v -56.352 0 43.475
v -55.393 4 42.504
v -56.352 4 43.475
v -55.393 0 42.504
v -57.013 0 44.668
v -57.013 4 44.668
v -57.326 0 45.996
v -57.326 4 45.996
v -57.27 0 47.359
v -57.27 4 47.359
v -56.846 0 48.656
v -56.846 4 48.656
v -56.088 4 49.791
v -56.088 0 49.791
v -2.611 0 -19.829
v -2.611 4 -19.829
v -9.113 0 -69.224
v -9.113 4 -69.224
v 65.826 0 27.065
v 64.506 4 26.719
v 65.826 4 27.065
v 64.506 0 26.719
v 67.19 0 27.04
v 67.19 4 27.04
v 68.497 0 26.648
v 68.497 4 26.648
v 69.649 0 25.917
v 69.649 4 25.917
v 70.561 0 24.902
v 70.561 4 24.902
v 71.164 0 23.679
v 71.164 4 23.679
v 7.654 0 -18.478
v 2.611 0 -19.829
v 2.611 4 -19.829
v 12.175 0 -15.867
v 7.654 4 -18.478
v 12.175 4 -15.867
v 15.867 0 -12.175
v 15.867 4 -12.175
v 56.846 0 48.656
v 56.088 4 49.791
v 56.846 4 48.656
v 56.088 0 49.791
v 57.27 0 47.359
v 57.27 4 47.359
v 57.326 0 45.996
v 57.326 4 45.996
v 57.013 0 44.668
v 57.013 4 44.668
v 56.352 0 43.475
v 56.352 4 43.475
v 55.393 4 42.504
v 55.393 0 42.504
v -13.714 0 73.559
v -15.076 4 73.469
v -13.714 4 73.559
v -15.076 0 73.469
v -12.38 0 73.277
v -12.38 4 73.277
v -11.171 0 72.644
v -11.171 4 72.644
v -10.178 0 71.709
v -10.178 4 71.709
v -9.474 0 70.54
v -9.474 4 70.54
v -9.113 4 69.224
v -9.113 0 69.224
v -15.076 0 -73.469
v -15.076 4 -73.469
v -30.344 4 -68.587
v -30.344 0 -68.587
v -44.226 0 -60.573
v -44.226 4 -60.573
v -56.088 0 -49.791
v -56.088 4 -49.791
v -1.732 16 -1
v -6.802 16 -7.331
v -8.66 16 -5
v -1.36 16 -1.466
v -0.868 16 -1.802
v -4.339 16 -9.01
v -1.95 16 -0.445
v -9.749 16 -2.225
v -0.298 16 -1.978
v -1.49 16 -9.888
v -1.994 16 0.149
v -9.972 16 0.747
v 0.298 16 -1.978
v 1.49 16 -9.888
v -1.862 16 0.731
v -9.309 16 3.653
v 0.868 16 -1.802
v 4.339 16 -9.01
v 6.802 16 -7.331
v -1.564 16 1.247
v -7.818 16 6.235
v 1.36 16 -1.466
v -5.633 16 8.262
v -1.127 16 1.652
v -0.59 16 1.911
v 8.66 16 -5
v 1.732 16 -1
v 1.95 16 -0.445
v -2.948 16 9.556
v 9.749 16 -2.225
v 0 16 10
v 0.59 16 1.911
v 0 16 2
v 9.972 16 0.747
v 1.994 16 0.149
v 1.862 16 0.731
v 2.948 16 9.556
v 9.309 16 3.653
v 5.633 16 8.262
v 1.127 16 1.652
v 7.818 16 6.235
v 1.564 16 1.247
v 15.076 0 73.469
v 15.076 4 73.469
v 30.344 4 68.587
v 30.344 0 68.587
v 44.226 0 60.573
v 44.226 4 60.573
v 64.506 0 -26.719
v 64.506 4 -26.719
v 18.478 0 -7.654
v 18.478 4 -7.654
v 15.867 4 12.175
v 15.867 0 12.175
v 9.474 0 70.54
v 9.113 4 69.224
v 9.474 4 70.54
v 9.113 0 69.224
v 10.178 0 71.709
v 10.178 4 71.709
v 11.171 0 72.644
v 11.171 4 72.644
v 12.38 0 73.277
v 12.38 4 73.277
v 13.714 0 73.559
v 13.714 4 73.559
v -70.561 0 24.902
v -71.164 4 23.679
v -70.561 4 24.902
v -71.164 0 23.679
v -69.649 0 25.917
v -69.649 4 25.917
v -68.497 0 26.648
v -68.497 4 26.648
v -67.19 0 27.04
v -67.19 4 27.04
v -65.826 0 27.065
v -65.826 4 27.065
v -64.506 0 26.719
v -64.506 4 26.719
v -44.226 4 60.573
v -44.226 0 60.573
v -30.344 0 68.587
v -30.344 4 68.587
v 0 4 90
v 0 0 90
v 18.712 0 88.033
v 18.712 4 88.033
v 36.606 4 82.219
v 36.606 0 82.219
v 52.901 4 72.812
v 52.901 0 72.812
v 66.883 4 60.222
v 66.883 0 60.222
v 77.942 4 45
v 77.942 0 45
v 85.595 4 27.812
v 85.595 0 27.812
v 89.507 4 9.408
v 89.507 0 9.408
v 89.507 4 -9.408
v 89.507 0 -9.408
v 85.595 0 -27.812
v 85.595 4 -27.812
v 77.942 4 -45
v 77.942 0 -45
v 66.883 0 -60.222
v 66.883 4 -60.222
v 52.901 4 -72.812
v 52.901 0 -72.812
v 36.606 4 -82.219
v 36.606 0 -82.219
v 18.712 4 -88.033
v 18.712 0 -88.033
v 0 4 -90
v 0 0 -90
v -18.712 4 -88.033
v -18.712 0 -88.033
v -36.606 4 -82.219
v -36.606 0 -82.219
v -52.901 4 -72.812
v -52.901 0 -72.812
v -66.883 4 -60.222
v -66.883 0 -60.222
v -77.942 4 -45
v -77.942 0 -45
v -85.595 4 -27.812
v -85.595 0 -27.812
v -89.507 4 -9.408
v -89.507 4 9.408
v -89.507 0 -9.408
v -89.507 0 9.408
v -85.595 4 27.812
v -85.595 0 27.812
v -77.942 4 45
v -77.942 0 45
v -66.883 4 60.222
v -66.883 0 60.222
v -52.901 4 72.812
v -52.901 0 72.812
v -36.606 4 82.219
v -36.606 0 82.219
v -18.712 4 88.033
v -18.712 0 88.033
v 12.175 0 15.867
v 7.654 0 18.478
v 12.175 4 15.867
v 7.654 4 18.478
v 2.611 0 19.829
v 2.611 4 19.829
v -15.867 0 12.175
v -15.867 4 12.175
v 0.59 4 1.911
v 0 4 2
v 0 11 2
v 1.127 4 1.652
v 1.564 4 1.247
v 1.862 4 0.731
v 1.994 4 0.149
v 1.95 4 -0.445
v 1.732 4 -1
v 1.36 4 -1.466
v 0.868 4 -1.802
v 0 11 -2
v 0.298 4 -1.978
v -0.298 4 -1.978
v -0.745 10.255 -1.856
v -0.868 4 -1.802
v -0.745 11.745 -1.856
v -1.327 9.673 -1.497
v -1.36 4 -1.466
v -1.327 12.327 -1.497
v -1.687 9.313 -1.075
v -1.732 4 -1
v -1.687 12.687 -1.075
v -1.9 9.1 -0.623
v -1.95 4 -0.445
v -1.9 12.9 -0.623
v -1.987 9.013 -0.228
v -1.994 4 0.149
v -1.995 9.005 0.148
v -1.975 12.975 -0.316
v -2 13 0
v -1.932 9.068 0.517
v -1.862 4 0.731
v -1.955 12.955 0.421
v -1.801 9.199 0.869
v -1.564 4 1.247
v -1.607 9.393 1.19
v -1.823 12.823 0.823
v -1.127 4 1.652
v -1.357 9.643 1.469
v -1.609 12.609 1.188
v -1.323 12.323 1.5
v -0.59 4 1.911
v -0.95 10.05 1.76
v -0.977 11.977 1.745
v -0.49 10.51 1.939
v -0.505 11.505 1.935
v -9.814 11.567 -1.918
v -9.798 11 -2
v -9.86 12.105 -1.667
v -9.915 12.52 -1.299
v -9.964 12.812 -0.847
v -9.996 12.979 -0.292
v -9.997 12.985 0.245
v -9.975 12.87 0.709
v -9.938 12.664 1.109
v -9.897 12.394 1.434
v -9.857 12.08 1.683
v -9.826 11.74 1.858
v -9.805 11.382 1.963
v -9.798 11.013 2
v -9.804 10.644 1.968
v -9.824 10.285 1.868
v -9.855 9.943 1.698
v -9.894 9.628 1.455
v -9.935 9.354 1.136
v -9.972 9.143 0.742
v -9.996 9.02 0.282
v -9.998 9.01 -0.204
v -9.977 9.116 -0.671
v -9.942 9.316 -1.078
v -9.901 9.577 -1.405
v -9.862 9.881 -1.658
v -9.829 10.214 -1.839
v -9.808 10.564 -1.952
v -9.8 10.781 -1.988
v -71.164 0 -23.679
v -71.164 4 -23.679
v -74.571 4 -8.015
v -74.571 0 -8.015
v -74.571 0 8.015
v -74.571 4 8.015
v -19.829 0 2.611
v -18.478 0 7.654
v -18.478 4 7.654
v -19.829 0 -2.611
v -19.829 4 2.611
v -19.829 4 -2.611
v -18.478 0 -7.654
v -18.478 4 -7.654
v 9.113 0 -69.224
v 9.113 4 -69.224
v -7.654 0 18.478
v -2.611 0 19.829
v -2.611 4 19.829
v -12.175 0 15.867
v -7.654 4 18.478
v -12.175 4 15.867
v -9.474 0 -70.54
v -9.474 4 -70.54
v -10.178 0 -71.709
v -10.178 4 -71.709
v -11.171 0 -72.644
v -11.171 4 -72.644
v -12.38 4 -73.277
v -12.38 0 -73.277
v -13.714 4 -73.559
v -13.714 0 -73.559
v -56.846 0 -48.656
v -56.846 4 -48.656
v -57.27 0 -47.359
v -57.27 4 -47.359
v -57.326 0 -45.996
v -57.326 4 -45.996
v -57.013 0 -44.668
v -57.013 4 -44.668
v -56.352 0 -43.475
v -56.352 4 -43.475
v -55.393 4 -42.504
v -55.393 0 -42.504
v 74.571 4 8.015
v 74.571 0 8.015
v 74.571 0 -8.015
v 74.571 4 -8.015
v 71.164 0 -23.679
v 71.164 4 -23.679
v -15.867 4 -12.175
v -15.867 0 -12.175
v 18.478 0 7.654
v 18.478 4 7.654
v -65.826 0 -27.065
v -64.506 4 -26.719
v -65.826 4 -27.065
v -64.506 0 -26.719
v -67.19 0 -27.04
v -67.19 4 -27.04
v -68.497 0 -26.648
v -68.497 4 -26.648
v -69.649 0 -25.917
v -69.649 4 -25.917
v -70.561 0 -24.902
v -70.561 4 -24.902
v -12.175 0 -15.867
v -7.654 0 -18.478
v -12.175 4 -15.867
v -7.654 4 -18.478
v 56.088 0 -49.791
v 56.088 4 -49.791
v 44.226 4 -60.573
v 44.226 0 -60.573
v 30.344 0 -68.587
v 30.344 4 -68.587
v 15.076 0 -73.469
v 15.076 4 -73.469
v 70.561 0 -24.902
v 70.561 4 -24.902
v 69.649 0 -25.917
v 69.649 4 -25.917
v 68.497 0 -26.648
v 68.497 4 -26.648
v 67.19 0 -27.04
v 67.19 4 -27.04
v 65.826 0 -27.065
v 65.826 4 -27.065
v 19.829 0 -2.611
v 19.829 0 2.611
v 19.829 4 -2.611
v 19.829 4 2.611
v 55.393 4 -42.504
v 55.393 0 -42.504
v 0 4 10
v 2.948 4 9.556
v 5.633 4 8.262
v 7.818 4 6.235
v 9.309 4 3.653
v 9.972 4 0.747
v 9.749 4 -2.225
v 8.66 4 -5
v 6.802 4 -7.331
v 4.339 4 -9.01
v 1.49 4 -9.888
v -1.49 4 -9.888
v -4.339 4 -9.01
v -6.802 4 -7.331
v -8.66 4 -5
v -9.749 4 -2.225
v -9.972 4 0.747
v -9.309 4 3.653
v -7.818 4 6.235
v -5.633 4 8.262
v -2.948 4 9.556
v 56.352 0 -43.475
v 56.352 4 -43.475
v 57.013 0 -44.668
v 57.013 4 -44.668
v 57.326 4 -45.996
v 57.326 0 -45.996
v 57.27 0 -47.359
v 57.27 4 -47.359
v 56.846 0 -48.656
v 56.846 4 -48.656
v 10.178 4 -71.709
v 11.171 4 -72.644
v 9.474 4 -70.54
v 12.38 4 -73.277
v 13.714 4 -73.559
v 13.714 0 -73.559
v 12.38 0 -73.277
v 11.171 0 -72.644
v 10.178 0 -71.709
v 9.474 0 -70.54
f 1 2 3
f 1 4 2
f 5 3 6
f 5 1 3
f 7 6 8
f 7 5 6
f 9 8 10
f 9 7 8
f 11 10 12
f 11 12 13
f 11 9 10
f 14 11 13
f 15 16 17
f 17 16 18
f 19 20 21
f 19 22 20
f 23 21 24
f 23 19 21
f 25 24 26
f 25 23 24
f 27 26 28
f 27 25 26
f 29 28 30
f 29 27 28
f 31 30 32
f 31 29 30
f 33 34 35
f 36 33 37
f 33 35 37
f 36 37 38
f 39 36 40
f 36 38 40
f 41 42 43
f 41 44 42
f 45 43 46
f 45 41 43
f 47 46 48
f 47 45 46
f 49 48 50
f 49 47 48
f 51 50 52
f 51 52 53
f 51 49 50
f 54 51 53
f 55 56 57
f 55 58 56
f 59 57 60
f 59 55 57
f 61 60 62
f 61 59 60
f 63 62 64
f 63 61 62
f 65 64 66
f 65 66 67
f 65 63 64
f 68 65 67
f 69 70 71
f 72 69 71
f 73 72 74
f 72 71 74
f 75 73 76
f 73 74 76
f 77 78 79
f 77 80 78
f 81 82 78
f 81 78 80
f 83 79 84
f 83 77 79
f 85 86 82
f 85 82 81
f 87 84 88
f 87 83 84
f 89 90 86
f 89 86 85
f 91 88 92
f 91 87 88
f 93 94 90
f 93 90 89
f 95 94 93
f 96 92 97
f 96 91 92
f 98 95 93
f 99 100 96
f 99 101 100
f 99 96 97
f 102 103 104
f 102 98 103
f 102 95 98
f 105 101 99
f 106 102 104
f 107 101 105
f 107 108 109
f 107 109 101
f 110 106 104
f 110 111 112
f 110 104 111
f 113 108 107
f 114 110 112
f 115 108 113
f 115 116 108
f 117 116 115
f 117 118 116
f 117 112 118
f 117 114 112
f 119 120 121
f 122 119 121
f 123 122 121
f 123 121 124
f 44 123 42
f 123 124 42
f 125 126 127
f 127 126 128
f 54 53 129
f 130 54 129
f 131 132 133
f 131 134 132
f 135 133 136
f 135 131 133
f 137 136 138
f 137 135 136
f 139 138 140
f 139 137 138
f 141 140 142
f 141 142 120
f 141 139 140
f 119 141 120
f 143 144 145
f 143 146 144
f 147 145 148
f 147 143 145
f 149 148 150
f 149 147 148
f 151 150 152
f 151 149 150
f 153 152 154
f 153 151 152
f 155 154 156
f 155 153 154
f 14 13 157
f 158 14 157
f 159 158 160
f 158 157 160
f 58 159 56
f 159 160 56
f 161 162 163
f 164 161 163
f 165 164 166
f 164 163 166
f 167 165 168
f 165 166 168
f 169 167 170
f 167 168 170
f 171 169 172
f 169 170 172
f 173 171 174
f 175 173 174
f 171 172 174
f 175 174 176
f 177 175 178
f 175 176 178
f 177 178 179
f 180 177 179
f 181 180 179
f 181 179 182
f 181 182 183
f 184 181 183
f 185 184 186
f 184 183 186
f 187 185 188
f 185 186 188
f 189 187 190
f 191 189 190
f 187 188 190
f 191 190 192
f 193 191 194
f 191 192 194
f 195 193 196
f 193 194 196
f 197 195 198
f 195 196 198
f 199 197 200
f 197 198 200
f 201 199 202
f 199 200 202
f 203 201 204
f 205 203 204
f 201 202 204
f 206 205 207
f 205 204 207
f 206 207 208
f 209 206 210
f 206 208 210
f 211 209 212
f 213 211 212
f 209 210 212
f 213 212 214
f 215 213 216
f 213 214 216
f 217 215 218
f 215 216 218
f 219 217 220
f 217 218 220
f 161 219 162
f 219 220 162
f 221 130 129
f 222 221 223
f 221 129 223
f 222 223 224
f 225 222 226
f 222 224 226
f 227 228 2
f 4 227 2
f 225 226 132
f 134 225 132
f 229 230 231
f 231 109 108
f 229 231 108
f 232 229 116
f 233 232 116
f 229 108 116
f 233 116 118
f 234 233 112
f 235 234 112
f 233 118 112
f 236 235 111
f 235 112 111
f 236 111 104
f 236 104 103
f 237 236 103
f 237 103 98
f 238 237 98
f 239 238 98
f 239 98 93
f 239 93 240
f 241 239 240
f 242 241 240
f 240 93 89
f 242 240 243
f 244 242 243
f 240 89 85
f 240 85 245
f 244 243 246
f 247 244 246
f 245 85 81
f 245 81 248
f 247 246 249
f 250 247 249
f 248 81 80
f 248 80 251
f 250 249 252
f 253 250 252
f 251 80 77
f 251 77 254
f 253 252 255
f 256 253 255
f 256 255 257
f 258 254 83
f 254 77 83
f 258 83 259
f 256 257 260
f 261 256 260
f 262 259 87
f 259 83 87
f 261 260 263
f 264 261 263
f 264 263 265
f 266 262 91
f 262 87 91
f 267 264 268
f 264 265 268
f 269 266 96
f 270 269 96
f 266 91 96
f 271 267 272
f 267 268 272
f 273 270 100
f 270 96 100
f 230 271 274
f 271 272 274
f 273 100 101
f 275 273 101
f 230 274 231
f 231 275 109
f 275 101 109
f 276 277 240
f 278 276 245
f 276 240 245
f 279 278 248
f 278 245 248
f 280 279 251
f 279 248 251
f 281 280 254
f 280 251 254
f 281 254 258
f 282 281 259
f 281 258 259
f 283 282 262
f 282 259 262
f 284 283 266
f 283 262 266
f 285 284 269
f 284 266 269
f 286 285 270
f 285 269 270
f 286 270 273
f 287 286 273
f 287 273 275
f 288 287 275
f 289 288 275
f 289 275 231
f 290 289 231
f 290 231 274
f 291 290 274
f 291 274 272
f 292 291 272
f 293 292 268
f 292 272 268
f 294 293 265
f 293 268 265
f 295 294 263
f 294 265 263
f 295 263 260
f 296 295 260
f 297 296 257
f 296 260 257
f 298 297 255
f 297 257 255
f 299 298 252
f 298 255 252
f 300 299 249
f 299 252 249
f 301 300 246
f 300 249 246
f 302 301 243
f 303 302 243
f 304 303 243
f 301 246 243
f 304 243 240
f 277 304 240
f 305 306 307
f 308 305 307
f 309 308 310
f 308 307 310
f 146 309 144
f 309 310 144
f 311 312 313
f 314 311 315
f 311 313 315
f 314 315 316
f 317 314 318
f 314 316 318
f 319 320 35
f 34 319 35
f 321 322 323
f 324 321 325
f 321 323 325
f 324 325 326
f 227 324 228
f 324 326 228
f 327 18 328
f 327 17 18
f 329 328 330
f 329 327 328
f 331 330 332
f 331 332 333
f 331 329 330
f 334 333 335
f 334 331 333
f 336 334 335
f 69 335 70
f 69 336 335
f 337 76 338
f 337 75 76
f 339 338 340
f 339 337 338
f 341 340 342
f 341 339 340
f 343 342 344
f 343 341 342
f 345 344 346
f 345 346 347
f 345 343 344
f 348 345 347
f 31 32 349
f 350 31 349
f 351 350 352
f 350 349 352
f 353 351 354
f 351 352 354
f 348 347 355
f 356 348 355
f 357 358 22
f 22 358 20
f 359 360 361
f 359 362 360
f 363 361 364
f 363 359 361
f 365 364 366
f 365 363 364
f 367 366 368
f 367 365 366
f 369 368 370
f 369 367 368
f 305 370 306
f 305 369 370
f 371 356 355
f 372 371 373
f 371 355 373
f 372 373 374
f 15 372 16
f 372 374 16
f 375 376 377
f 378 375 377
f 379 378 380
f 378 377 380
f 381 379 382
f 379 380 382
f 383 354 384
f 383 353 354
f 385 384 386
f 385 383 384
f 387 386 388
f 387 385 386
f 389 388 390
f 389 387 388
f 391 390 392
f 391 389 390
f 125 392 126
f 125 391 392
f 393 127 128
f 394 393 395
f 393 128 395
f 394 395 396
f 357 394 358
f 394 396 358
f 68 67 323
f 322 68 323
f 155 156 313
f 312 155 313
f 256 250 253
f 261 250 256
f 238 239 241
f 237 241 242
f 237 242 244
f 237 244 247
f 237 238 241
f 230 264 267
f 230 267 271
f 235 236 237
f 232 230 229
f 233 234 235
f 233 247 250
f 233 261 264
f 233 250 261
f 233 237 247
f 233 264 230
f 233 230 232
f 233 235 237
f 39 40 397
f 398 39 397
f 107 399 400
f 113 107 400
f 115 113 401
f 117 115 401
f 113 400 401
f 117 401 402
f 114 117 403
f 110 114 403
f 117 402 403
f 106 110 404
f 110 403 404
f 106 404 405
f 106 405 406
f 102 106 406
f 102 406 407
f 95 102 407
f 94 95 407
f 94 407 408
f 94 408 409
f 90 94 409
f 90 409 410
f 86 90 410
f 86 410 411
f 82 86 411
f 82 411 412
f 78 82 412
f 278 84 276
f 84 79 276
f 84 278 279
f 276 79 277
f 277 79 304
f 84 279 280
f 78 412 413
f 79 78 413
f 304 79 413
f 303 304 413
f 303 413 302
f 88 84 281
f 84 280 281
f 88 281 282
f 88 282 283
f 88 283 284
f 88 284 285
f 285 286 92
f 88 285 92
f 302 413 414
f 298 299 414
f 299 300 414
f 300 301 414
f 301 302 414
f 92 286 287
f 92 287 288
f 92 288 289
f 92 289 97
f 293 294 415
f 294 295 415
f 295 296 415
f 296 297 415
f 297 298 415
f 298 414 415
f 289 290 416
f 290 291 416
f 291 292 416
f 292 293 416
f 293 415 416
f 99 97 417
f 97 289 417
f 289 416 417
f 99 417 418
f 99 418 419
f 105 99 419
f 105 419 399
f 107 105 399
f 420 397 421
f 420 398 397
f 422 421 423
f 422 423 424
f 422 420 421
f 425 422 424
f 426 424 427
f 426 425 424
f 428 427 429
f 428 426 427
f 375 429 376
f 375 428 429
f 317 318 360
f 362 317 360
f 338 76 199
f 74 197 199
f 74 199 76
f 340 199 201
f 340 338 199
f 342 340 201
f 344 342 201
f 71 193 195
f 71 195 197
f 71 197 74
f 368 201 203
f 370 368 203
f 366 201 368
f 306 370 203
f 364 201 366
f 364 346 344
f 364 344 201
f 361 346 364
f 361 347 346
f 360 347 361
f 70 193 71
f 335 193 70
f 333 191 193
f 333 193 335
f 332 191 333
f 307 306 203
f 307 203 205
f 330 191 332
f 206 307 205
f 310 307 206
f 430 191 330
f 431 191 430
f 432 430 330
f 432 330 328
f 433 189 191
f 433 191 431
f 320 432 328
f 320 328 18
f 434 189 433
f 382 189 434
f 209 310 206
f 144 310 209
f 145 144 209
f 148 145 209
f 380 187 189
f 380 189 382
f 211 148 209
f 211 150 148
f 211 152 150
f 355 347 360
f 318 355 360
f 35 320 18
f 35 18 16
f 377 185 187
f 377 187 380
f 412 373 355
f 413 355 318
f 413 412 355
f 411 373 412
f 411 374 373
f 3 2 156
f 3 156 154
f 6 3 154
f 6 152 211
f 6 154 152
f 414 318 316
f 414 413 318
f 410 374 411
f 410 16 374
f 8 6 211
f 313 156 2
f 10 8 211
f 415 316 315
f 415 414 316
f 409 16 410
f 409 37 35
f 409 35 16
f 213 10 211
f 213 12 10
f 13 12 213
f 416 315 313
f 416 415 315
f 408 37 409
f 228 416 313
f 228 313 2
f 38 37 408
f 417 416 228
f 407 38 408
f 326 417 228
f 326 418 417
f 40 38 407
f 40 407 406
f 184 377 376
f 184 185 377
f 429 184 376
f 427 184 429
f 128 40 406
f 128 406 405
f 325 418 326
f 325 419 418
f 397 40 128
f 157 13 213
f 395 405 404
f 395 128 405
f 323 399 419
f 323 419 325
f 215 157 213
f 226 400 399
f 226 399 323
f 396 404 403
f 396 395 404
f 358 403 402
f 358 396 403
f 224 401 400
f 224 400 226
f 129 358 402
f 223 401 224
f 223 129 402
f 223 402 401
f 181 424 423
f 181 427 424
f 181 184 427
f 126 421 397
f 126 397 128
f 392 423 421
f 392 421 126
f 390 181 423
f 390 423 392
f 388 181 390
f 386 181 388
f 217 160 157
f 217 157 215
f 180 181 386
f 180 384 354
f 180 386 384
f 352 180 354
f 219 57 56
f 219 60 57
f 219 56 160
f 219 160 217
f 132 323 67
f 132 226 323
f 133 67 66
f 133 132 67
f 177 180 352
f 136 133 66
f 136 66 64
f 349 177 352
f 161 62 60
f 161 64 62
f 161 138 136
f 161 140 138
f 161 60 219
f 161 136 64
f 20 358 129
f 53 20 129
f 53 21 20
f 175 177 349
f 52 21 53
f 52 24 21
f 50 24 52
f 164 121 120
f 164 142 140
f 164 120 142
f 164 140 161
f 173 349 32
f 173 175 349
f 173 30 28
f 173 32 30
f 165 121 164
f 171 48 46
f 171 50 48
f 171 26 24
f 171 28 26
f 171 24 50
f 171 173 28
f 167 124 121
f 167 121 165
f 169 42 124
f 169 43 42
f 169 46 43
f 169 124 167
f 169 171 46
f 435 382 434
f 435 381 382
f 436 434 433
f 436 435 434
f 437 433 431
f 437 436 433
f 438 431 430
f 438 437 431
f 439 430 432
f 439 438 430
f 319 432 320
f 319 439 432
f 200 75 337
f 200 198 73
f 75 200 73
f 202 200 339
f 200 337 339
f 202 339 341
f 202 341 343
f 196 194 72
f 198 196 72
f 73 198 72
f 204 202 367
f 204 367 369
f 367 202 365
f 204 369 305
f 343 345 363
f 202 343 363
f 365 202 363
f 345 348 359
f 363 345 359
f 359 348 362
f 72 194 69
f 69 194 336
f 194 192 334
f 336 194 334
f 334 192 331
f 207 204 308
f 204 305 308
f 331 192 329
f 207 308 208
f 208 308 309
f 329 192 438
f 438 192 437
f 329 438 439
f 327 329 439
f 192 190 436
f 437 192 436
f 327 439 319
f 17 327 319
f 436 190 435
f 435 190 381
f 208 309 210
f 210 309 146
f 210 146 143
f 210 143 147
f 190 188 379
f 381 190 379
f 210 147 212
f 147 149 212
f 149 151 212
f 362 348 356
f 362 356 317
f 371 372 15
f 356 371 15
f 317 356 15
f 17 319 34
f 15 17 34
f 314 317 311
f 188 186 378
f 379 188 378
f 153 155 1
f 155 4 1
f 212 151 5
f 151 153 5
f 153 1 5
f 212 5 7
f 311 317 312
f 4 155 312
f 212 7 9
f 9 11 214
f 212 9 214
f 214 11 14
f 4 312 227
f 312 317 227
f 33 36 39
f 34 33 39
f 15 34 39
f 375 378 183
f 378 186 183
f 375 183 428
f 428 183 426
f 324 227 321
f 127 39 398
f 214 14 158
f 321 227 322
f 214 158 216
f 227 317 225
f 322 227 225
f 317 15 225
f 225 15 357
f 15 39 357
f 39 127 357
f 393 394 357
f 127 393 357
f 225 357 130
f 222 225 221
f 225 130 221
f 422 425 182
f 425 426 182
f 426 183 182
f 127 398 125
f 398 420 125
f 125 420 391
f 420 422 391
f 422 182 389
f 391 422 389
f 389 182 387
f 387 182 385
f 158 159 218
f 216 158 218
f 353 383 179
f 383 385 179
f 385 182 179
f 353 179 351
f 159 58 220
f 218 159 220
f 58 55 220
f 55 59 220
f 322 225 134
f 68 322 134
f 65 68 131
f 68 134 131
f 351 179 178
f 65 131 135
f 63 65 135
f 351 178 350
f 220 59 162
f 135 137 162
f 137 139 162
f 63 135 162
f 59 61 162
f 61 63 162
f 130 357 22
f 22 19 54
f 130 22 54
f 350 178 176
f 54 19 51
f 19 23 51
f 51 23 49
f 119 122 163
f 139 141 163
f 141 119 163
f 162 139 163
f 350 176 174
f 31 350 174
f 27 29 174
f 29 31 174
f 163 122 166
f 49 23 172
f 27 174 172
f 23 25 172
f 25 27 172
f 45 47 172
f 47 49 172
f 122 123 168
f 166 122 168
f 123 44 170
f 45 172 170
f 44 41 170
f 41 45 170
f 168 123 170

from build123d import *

# Parameters (mm, degrees)
SKETCH_1_R               = 90
EXTRUDE_1_DEPTH          = 4
CUT_EXTRUDE_1_DEPTH      = 128.342059038
PATTERN_CIRCULAR_1_COUNT = 6
SKETCH_6_R               = 10
EXTRUDE_2_DEPTH          = 12
SKETCH_7_R               = 2
CUT_EXTRUDE_2_DEPTH      = 12
FILLET_1_R               = 5
FILLET_2_R               = 5
SKETCH_9_R               = 2
CUT_EXTRUDE_3_DEPTH      = 10


with BuildPart() as part:
    # 草图1 → 凸台-拉伸1 (new body)
    with BuildSketch(Plane(origin=(0, 0, 0), x_dir=(1, 0, 0), z_dir=(0, 1, 0))):
        Circle(SKETCH_1_R)
    extrude(amount=EXTRUDE_1_DEPTH)

    # 草图2 → 切除-拉伸1 (cut, through all)
    with BuildSketch(Plane(origin=(0, 4, 0), x_dir=(1, 0, 0), z_dir=(0, 1, 0))):
        with BuildLine():
            ThreePointArc((-15.867066806, 12.17522858), (-10, 17.320508076), (-2.610523844, 19.828897227))
            Line((-2.610523844, 19.828897227), (-9.789464417, 74.358364603))
            ThreePointArc((-9.789464417, 74.358364603), (-37.5, 64.951905284), (-59.501500522, 45.657107176))
            Line((-59.501500522, 45.657107176), (-15.867066806, 12.17522858))
        make_face()
    cut_extrude_1 = extrude(amount=-CUT_EXTRUDE_1_DEPTH, mode=Mode.SUBTRACT)

    # 阵列(圆周)1: 切除-拉伸1 ×6 about axis
    pattern_circular_1_axis = Axis((0, 4, 0), (0, 1, 0))
    for i in range(1, PATTERN_CIRCULAR_1_COUNT):
        add(cut_extrude_1.rotate(pattern_circular_1_axis, i * 360 / PATTERN_CIRCULAR_1_COUNT), mode=Mode.SUBTRACT)

    # 草图6 → 凸台-拉伸2 (add)
    with BuildSketch(Plane(origin=(0, 4, 0), x_dir=(1, 0, 0), z_dir=(0, 1, 0))):
        Circle(SKETCH_6_R)
    extrude(amount=EXTRUDE_2_DEPTH)

    # 草图7 → 切除-拉伸2 (cut)
    with BuildSketch(Plane(origin=(0, 16, 0), x_dir=(1, 0, 0), z_dir=(0, 1, 0))):
        Circle(SKETCH_7_R)
    extrude(amount=-CUT_EXTRUDE_2_DEPTH, mode=Mode.SUBTRACT)

    # 圆角1
    fillet_1_edges = [part.edges().sort_by_distance(p)[0] for p in [
        (9.789464417, 2, 74.358364603),
    ]]
    fillet(fillet_1_edges, radius=FILLET_1_R)

    # 圆角2
    fillet_2_edges = [part.edges().sort_by_distance(p)[0] for p in [
        (-59.501500522, 2, 45.657107176),
        (-9.789464417, 2, 74.358364603),
        (-69.290964938, 2, 28.701257427),
        (-69.290964938, 2, -28.701257427),
        (-9.789464417, 2, -74.358364603),
        (-59.501500522, 2, -45.657107176),
        (9.789464417, 2, -74.358364603),
        (59.501500522, 2, -45.657107176),
        (69.290964938, 2, -28.701257427),
        (69.290964938, 2, 28.701257427),
        (59.501500522, 2, 45.657107176),
    ]]
    fillet(fillet_2_edges, radius=FILLET_2_R)

    # 草图9 → 切除-拉伸3 (cut)
    with BuildSketch(Plane(origin=(0, 0, 0), x_dir=(0, 0, -1), z_dir=(1, 0, 0))):
        with Locations((0, 11)):
            Circle(SKETCH_9_R)
    extrude(amount=-CUT_EXTRUDE_3_DEPTH, mode=Mode.SUBTRACT)


solid = part.part
